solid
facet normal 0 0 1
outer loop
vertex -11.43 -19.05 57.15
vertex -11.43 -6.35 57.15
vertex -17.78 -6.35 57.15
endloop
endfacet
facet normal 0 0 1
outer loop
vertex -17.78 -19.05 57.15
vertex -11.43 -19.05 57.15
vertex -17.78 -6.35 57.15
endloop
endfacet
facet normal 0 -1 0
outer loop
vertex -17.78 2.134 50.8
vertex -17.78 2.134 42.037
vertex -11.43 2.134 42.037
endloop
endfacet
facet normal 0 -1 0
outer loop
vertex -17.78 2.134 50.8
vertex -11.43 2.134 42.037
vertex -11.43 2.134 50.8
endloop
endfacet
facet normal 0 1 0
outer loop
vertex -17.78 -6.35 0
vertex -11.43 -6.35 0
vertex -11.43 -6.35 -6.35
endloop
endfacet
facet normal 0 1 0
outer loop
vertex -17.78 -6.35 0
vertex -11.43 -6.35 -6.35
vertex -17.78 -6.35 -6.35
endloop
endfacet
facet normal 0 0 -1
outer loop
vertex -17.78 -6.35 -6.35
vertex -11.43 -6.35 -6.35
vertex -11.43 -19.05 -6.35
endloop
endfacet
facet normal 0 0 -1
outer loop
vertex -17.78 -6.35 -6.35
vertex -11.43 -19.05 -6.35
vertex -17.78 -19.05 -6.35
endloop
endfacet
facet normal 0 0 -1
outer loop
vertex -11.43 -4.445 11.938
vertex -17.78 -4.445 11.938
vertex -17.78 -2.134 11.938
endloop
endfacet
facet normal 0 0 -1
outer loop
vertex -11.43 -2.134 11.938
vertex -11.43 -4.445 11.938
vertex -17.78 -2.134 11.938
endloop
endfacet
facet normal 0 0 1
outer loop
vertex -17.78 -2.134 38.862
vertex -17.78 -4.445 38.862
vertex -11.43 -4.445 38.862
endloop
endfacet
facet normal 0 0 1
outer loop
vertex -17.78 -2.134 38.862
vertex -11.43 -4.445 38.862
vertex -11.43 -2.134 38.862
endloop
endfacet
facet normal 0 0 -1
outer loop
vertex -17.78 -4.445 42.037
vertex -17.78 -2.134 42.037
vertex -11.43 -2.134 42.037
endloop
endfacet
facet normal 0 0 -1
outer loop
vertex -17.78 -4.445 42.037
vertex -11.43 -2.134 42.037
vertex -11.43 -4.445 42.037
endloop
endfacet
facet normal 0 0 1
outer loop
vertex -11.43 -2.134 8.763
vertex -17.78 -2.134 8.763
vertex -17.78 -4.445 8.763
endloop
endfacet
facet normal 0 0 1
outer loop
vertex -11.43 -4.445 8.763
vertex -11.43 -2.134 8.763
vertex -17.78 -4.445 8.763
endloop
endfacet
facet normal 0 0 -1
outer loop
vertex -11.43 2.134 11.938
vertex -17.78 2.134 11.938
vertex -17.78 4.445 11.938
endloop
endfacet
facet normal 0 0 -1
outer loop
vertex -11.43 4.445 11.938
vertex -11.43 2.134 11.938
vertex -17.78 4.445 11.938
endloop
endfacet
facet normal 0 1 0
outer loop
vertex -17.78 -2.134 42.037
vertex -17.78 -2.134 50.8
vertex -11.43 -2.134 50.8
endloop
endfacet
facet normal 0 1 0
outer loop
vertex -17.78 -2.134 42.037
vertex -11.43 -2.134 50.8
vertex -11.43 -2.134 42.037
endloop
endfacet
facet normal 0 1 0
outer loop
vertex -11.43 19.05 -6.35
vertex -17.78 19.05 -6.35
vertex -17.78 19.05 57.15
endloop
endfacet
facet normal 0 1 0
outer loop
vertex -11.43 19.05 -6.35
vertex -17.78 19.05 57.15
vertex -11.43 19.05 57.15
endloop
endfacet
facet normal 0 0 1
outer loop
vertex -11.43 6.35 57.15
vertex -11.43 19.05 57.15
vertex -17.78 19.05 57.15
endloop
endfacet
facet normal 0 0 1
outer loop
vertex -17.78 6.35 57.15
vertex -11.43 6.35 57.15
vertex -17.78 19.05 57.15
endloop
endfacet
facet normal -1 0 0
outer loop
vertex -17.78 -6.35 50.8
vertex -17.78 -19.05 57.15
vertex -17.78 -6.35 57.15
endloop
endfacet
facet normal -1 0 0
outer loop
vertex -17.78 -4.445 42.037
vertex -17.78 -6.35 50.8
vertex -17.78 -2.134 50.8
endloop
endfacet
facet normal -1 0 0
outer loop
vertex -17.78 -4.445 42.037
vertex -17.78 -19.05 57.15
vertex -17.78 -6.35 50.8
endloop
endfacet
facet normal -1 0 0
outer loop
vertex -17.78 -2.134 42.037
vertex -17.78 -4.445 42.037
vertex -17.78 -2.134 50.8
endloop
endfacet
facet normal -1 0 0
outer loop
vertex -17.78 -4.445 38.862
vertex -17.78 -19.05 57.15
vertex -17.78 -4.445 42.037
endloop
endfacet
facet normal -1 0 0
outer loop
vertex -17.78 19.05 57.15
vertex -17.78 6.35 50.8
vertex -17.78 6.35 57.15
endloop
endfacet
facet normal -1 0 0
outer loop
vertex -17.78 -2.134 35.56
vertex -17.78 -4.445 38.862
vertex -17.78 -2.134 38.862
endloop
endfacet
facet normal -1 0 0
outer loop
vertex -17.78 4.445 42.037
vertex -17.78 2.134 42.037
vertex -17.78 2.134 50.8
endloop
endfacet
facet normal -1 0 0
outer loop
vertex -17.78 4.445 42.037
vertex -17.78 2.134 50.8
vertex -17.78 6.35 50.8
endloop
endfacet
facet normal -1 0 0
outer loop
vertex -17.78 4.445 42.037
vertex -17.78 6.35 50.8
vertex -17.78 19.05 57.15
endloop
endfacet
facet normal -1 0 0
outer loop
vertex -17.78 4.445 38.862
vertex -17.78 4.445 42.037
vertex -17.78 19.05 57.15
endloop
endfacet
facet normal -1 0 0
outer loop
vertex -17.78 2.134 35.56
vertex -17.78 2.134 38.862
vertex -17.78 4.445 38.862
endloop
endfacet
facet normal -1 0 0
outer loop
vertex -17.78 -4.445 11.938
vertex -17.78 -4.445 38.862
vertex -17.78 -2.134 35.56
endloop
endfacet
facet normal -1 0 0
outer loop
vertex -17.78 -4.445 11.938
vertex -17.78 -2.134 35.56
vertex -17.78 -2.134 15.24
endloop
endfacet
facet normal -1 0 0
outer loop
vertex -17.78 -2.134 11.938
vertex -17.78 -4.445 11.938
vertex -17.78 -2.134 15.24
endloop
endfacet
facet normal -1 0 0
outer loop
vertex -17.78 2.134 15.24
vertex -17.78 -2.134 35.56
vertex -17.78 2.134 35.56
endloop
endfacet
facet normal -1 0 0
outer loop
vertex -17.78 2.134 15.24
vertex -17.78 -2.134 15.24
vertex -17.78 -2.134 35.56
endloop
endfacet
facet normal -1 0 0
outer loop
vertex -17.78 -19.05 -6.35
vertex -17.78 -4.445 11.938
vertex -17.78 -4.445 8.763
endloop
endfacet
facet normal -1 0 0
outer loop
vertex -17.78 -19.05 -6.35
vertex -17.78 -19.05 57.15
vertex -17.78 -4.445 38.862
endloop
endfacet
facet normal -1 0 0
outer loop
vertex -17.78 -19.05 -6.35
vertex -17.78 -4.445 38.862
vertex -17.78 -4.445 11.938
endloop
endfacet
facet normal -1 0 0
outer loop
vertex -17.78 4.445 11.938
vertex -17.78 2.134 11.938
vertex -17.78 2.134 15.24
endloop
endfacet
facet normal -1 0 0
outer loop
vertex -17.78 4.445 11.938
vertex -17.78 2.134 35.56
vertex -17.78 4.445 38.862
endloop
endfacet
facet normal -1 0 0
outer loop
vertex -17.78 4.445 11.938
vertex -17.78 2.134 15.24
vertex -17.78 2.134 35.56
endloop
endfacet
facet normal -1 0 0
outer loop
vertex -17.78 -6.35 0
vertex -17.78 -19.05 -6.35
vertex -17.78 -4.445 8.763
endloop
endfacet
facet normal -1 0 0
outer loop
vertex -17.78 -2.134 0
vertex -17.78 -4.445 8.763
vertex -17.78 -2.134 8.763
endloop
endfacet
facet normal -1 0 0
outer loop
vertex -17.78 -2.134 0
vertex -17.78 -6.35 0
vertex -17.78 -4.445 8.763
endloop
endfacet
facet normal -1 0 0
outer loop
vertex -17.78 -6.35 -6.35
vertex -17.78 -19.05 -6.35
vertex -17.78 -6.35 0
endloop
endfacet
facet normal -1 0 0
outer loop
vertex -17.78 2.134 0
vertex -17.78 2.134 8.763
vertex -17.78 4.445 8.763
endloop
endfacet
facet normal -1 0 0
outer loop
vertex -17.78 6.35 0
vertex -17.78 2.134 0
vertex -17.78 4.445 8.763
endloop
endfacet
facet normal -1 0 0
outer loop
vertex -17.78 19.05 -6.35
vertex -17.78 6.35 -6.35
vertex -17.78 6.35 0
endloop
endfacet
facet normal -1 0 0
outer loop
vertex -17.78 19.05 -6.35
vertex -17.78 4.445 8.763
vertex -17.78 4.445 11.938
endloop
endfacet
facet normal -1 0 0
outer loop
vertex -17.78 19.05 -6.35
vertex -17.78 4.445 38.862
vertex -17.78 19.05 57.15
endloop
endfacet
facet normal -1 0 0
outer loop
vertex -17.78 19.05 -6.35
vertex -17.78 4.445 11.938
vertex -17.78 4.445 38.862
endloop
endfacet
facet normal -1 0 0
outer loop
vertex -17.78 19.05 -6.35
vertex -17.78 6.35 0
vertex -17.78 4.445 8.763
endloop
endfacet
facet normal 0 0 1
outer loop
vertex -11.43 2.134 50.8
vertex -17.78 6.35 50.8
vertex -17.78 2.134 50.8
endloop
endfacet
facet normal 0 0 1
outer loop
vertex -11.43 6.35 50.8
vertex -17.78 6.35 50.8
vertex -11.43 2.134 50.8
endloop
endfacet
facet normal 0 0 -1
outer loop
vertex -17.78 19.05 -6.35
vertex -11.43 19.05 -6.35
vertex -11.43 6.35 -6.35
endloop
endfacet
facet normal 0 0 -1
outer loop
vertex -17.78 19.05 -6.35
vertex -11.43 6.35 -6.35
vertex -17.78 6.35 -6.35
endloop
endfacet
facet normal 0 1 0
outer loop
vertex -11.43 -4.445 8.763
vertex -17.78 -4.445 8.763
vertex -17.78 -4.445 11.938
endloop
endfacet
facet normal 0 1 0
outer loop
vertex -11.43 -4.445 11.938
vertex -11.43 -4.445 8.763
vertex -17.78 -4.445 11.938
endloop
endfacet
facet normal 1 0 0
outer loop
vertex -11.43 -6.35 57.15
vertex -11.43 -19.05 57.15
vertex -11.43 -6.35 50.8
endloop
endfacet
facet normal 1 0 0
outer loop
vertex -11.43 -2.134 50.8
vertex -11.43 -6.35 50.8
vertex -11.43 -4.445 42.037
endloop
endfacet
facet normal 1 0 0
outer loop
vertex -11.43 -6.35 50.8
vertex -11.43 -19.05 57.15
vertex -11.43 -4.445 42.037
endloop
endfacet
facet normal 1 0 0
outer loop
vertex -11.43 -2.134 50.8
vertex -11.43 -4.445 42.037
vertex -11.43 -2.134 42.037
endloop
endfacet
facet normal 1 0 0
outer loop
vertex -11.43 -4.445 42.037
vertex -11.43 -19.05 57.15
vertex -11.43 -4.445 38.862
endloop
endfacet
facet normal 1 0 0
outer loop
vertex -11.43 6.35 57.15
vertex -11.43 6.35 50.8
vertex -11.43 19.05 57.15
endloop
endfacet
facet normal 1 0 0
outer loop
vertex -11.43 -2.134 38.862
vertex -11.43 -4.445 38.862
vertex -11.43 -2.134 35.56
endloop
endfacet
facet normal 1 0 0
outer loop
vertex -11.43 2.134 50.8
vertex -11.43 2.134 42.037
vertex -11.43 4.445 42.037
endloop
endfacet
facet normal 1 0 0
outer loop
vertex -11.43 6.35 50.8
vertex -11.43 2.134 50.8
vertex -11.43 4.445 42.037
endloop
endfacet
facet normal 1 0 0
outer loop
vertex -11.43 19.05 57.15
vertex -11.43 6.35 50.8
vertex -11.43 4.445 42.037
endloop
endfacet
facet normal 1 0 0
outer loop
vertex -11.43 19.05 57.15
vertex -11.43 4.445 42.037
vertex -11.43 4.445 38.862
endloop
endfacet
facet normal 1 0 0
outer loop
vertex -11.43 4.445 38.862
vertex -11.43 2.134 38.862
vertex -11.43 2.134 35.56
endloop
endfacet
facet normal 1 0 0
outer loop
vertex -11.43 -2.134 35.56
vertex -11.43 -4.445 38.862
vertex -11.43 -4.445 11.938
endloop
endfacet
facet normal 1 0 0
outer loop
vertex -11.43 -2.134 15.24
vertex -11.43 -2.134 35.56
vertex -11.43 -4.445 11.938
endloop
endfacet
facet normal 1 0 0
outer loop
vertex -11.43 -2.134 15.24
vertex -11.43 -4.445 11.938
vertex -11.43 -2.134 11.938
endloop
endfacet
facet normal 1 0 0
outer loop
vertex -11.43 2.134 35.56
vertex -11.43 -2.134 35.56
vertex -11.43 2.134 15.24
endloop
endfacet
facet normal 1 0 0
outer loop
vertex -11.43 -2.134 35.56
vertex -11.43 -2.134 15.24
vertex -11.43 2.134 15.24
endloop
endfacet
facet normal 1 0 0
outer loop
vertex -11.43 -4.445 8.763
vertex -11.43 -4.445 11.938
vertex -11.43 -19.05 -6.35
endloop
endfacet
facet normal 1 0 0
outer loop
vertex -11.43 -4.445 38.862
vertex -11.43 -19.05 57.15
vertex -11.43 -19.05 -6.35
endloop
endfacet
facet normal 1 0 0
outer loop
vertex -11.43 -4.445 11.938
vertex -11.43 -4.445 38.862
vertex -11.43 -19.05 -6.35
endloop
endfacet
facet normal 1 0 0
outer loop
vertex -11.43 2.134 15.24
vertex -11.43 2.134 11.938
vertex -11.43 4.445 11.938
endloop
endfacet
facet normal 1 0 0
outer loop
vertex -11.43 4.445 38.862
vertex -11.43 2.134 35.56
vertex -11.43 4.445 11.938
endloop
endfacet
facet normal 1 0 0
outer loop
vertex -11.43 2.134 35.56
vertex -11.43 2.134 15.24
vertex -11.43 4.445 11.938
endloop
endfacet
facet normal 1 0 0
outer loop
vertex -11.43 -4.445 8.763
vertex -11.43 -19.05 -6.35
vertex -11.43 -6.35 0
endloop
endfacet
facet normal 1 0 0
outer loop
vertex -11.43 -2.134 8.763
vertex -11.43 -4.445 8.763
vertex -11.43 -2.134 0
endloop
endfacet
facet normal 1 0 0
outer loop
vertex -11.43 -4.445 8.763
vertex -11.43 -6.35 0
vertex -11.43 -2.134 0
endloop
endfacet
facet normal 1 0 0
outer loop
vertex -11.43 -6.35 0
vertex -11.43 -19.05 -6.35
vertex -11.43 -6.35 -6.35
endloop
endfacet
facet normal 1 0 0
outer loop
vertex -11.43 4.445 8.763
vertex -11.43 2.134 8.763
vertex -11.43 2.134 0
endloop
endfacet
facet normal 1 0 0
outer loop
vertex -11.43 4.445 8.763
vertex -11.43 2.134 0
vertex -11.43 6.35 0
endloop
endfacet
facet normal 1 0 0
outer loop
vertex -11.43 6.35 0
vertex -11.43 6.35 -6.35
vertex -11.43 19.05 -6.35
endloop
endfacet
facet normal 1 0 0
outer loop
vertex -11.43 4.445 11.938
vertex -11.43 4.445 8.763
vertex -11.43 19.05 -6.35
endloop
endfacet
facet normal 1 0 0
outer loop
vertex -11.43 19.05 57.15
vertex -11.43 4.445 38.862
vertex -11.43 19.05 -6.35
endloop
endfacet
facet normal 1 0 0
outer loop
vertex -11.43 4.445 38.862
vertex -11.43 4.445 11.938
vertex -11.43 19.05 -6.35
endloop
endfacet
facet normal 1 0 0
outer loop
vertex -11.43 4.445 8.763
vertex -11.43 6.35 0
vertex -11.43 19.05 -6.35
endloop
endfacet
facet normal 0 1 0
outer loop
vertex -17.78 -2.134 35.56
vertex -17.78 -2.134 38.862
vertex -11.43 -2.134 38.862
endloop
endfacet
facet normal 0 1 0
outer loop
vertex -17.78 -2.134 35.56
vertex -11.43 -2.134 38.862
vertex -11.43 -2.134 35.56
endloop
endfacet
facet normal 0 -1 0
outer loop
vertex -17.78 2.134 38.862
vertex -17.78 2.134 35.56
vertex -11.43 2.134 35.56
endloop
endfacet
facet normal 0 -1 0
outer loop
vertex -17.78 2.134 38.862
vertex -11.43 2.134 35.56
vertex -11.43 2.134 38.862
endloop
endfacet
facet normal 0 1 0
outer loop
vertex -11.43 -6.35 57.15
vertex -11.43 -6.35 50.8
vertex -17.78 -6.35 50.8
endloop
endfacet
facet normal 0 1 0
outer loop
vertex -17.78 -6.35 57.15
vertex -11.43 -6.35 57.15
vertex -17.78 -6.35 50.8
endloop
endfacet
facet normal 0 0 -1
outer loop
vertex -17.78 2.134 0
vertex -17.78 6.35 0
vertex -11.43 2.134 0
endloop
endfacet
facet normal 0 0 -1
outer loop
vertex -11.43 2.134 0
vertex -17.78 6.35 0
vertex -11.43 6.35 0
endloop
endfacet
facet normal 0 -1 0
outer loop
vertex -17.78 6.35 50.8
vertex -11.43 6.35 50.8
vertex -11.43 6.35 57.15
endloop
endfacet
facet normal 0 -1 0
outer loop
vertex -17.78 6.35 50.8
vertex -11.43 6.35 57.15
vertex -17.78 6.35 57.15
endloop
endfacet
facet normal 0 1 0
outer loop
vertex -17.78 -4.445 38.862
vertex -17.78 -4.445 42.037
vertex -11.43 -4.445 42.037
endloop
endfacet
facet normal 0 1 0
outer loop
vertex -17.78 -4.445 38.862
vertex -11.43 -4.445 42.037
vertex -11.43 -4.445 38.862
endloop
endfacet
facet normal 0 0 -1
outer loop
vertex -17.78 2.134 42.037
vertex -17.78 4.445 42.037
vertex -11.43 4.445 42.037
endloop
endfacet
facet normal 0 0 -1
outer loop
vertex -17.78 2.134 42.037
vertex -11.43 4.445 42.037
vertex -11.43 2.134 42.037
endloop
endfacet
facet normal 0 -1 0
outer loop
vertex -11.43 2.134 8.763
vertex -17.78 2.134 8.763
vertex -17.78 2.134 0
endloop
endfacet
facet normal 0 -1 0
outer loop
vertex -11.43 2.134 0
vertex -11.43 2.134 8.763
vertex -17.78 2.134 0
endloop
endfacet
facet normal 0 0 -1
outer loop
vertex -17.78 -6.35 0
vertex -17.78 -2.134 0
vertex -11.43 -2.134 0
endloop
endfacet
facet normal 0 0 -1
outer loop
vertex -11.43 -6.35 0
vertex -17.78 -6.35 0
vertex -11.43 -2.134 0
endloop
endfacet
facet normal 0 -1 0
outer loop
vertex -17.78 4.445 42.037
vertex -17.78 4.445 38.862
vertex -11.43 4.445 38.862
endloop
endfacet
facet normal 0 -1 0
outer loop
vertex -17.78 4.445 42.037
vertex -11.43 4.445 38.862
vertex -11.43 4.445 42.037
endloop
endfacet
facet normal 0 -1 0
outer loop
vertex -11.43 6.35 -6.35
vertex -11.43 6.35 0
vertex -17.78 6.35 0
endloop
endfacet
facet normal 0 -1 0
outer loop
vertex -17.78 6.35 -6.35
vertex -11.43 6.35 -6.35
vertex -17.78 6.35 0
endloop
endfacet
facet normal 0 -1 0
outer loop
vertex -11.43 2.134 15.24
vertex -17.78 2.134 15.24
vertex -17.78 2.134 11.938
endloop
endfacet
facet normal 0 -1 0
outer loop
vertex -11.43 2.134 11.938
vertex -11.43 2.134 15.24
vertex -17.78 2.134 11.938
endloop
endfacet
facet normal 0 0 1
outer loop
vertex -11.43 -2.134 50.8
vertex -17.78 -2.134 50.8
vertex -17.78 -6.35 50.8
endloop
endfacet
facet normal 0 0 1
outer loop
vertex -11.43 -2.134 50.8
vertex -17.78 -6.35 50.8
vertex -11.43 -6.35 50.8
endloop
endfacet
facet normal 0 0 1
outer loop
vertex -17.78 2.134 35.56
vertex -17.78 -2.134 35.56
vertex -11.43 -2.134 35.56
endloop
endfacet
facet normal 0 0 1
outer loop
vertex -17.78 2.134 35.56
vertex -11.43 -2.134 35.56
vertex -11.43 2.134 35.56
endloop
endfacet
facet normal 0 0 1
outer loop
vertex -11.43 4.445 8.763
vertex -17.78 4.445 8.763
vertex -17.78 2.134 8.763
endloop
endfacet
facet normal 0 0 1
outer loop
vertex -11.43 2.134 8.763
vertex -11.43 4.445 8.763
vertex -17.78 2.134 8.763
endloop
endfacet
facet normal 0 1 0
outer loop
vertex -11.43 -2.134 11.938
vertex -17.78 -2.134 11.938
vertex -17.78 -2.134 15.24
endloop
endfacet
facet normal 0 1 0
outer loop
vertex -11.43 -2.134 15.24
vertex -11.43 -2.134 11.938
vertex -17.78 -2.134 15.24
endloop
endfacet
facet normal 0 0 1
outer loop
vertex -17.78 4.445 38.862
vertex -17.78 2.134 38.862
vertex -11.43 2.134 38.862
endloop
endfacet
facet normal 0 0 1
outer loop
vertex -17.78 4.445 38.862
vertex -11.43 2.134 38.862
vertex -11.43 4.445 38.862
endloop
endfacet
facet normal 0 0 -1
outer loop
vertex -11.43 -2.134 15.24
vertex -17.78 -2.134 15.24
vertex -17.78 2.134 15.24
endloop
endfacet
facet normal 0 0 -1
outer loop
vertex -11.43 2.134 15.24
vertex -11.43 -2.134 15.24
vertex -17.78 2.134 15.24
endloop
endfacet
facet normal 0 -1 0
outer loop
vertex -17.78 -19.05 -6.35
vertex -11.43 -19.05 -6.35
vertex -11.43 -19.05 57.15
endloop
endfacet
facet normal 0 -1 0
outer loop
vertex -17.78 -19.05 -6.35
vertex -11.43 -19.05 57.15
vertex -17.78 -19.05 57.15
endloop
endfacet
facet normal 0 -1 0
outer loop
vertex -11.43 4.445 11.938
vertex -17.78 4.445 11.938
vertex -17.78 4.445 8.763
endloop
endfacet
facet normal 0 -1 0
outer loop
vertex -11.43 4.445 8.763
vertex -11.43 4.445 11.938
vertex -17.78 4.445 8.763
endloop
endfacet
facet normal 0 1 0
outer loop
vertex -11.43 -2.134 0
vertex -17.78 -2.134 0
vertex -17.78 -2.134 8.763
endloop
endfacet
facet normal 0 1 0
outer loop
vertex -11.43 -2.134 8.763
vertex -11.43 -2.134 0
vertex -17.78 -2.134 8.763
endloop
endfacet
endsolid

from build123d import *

# Parameters (mm, degrees)
SKETCH1_W           = 6.35
SKETCH1_H           = 38.1
BOSS_EXTRUDE1_DEPTH = 50.8
SKETCH2_W           = 6.35
SKETCH2_H           = 12.7
BOSS_EXTRUDE2_DEPTH = 6.35
CUT_EXTRUDE1_DEPTH  = 55.624765446


with BuildPart() as part:
    # Sketch1 → Boss-Extrude1 (new body)
    with BuildSketch(Plane.XY):
        with Locations((-14.605, 0)):
            Rectangle(SKETCH1_W, SKETCH1_H)
    extrude(amount=BOSS_EXTRUDE1_DEPTH)

    # Sketch2 → Boss-Extrude2 (add)
    with BuildSketch(Plane(origin=(0, 0, 0), x_dir=(-1, 0, 0), z_dir=(0, 0, -1))):
        with Locations((14.605, -12.7)):
            Rectangle(SKETCH2_W, SKETCH2_H)
        with Locations((14.605, 12.7)):
            Rectangle(SKETCH2_W, SKETCH2_H)
    boss_extrude2 = extrude(amount=BOSS_EXTRUDE2_DEPTH)

    # Sketch3 → Cut-Extrude1 (cut, through all)
    with BuildSketch(Plane.ZY.offset(17.78)):
        Polygon((0, 2.1336), (0, -2.1336), (8.763, -2.1336), (8.763, -4.445), (11.938, -4.445), (11.938, -2.1336), (15.24, -2.1336), (15.24, 2.1336), (11.938, 2.1336), (11.938, 4.445), (8.763, 4.445), (8.763, 2.1336), align=None)
    cut_extrude1 = extrude(amount=-CUT_EXTRUDE1_DEPTH, mode=Mode.SUBTRACT)

    # Mirror1: Boss-Extrude2, Cut-Extrude1 across plane
    add(boss_extrude2.mirror(Plane.XY.offset(25.4)))
    add(cut_extrude1.mirror(Plane.XY.offset(25.4)), mode=Mode.SUBTRACT)


solid = part.part
